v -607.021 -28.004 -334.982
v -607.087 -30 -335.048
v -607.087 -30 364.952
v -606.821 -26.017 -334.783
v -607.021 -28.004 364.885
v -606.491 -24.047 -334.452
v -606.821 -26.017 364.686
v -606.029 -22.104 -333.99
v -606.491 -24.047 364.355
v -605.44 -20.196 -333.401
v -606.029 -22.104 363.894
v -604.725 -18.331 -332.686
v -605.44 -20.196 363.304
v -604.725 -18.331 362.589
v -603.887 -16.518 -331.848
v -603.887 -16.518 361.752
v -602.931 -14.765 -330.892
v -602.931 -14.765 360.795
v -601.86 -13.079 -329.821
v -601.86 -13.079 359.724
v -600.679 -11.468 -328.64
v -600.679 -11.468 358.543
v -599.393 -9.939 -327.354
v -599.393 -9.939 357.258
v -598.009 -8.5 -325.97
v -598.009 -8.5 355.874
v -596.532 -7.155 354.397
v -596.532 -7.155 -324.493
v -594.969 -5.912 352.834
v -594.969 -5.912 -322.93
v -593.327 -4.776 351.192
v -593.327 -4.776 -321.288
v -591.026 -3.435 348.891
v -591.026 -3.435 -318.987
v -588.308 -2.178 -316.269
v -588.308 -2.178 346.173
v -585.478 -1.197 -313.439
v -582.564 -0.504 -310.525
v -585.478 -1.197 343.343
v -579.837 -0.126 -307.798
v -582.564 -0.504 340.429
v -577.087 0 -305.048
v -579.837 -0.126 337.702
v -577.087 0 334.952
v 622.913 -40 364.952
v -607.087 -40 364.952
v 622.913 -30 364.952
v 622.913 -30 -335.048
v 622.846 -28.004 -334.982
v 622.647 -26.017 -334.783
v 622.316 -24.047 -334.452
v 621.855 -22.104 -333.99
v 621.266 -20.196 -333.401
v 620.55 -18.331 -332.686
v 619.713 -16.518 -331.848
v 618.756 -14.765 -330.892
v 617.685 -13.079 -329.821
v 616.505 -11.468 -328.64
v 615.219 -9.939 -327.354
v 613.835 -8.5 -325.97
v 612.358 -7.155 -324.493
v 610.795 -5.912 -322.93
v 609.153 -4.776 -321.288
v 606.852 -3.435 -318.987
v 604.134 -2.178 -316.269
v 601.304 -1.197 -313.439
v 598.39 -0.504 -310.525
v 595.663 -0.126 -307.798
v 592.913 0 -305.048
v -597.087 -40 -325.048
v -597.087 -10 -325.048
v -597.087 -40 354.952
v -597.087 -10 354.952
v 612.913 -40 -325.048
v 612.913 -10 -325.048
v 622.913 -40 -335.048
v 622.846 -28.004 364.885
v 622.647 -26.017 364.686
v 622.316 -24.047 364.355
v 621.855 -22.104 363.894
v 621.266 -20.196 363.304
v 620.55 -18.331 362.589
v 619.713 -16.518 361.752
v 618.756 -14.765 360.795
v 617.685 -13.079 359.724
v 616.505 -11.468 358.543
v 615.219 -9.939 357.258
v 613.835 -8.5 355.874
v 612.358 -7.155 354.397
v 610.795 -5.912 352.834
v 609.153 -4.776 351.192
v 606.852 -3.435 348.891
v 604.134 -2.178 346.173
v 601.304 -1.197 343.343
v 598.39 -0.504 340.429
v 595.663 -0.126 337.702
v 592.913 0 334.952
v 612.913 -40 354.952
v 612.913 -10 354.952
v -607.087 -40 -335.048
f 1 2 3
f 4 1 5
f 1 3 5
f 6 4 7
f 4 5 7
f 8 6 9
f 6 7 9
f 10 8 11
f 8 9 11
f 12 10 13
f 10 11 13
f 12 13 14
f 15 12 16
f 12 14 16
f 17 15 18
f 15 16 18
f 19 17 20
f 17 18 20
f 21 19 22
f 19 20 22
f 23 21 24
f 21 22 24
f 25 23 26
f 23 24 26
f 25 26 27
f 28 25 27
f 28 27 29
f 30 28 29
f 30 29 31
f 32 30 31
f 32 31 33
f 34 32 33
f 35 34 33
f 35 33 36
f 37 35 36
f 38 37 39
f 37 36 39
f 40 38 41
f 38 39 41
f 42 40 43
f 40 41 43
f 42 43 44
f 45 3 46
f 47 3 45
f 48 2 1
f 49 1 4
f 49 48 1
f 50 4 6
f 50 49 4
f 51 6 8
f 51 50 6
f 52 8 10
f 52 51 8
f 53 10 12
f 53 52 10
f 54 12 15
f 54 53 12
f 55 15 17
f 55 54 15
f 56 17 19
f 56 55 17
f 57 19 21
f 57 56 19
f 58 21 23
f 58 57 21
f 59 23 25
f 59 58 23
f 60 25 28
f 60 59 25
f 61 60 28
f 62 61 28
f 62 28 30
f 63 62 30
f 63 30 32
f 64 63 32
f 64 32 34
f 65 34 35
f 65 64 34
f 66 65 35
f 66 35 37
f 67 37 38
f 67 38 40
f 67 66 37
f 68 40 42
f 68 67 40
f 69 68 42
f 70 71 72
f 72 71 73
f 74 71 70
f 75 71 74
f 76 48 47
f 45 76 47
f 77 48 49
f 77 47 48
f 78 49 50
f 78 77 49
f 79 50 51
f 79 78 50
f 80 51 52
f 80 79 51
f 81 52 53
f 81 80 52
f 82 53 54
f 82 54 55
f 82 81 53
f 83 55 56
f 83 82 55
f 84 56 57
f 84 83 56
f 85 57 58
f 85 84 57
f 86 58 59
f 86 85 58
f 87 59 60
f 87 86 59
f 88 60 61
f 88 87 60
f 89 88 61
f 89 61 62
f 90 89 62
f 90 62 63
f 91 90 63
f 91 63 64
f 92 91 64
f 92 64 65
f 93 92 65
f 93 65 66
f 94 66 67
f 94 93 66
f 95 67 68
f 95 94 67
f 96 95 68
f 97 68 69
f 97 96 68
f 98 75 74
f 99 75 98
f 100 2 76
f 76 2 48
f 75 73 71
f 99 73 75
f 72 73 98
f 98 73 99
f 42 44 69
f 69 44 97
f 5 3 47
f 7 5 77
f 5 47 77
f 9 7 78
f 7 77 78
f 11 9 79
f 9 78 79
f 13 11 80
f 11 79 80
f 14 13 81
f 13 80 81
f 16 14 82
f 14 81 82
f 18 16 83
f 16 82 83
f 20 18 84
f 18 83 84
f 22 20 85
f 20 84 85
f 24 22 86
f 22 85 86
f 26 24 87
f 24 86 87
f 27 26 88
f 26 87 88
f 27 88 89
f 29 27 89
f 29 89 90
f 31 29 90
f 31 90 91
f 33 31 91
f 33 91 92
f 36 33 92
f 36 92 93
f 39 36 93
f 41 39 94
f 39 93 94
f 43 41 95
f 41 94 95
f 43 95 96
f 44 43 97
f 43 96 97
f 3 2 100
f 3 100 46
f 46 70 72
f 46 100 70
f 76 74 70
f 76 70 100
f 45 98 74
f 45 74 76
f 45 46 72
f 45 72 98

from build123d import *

# Parameters (mm, degrees)
F0_W     = 1230
F0_H     = 700
F1_DEPTH = 40
F3_T     = -10
F4_R     = 30


with BuildPart() as f1:
    # F0 (on Front) → F1 (new body)
    with BuildSketch(Plane.XZ):
        with Locations((7.912883, 14.9518)):
            Rectangle(F0_W, F0_H)
    extrude(amount=F1_DEPTH)

    # F3
    f3_openings = [f1.faces().sort_by_distance(p)[0] for p in [
        (7.912883, -40, 14.9518),
    ]]
    offset(amount=F3_T, openings=f3_openings)

    # F4
    f4_edges = [f1.edges().sort_by_distance(p)[0] for p in [
        (7.912883, 0, -335.0482),
        (7.912883, 0, 364.9518),
        (-607.087117, 0, 14.9518),
        (622.912883, 0, 14.9518),
    ]]
    fillet(f4_edges, radius=F4_R)


solid = f1.part
